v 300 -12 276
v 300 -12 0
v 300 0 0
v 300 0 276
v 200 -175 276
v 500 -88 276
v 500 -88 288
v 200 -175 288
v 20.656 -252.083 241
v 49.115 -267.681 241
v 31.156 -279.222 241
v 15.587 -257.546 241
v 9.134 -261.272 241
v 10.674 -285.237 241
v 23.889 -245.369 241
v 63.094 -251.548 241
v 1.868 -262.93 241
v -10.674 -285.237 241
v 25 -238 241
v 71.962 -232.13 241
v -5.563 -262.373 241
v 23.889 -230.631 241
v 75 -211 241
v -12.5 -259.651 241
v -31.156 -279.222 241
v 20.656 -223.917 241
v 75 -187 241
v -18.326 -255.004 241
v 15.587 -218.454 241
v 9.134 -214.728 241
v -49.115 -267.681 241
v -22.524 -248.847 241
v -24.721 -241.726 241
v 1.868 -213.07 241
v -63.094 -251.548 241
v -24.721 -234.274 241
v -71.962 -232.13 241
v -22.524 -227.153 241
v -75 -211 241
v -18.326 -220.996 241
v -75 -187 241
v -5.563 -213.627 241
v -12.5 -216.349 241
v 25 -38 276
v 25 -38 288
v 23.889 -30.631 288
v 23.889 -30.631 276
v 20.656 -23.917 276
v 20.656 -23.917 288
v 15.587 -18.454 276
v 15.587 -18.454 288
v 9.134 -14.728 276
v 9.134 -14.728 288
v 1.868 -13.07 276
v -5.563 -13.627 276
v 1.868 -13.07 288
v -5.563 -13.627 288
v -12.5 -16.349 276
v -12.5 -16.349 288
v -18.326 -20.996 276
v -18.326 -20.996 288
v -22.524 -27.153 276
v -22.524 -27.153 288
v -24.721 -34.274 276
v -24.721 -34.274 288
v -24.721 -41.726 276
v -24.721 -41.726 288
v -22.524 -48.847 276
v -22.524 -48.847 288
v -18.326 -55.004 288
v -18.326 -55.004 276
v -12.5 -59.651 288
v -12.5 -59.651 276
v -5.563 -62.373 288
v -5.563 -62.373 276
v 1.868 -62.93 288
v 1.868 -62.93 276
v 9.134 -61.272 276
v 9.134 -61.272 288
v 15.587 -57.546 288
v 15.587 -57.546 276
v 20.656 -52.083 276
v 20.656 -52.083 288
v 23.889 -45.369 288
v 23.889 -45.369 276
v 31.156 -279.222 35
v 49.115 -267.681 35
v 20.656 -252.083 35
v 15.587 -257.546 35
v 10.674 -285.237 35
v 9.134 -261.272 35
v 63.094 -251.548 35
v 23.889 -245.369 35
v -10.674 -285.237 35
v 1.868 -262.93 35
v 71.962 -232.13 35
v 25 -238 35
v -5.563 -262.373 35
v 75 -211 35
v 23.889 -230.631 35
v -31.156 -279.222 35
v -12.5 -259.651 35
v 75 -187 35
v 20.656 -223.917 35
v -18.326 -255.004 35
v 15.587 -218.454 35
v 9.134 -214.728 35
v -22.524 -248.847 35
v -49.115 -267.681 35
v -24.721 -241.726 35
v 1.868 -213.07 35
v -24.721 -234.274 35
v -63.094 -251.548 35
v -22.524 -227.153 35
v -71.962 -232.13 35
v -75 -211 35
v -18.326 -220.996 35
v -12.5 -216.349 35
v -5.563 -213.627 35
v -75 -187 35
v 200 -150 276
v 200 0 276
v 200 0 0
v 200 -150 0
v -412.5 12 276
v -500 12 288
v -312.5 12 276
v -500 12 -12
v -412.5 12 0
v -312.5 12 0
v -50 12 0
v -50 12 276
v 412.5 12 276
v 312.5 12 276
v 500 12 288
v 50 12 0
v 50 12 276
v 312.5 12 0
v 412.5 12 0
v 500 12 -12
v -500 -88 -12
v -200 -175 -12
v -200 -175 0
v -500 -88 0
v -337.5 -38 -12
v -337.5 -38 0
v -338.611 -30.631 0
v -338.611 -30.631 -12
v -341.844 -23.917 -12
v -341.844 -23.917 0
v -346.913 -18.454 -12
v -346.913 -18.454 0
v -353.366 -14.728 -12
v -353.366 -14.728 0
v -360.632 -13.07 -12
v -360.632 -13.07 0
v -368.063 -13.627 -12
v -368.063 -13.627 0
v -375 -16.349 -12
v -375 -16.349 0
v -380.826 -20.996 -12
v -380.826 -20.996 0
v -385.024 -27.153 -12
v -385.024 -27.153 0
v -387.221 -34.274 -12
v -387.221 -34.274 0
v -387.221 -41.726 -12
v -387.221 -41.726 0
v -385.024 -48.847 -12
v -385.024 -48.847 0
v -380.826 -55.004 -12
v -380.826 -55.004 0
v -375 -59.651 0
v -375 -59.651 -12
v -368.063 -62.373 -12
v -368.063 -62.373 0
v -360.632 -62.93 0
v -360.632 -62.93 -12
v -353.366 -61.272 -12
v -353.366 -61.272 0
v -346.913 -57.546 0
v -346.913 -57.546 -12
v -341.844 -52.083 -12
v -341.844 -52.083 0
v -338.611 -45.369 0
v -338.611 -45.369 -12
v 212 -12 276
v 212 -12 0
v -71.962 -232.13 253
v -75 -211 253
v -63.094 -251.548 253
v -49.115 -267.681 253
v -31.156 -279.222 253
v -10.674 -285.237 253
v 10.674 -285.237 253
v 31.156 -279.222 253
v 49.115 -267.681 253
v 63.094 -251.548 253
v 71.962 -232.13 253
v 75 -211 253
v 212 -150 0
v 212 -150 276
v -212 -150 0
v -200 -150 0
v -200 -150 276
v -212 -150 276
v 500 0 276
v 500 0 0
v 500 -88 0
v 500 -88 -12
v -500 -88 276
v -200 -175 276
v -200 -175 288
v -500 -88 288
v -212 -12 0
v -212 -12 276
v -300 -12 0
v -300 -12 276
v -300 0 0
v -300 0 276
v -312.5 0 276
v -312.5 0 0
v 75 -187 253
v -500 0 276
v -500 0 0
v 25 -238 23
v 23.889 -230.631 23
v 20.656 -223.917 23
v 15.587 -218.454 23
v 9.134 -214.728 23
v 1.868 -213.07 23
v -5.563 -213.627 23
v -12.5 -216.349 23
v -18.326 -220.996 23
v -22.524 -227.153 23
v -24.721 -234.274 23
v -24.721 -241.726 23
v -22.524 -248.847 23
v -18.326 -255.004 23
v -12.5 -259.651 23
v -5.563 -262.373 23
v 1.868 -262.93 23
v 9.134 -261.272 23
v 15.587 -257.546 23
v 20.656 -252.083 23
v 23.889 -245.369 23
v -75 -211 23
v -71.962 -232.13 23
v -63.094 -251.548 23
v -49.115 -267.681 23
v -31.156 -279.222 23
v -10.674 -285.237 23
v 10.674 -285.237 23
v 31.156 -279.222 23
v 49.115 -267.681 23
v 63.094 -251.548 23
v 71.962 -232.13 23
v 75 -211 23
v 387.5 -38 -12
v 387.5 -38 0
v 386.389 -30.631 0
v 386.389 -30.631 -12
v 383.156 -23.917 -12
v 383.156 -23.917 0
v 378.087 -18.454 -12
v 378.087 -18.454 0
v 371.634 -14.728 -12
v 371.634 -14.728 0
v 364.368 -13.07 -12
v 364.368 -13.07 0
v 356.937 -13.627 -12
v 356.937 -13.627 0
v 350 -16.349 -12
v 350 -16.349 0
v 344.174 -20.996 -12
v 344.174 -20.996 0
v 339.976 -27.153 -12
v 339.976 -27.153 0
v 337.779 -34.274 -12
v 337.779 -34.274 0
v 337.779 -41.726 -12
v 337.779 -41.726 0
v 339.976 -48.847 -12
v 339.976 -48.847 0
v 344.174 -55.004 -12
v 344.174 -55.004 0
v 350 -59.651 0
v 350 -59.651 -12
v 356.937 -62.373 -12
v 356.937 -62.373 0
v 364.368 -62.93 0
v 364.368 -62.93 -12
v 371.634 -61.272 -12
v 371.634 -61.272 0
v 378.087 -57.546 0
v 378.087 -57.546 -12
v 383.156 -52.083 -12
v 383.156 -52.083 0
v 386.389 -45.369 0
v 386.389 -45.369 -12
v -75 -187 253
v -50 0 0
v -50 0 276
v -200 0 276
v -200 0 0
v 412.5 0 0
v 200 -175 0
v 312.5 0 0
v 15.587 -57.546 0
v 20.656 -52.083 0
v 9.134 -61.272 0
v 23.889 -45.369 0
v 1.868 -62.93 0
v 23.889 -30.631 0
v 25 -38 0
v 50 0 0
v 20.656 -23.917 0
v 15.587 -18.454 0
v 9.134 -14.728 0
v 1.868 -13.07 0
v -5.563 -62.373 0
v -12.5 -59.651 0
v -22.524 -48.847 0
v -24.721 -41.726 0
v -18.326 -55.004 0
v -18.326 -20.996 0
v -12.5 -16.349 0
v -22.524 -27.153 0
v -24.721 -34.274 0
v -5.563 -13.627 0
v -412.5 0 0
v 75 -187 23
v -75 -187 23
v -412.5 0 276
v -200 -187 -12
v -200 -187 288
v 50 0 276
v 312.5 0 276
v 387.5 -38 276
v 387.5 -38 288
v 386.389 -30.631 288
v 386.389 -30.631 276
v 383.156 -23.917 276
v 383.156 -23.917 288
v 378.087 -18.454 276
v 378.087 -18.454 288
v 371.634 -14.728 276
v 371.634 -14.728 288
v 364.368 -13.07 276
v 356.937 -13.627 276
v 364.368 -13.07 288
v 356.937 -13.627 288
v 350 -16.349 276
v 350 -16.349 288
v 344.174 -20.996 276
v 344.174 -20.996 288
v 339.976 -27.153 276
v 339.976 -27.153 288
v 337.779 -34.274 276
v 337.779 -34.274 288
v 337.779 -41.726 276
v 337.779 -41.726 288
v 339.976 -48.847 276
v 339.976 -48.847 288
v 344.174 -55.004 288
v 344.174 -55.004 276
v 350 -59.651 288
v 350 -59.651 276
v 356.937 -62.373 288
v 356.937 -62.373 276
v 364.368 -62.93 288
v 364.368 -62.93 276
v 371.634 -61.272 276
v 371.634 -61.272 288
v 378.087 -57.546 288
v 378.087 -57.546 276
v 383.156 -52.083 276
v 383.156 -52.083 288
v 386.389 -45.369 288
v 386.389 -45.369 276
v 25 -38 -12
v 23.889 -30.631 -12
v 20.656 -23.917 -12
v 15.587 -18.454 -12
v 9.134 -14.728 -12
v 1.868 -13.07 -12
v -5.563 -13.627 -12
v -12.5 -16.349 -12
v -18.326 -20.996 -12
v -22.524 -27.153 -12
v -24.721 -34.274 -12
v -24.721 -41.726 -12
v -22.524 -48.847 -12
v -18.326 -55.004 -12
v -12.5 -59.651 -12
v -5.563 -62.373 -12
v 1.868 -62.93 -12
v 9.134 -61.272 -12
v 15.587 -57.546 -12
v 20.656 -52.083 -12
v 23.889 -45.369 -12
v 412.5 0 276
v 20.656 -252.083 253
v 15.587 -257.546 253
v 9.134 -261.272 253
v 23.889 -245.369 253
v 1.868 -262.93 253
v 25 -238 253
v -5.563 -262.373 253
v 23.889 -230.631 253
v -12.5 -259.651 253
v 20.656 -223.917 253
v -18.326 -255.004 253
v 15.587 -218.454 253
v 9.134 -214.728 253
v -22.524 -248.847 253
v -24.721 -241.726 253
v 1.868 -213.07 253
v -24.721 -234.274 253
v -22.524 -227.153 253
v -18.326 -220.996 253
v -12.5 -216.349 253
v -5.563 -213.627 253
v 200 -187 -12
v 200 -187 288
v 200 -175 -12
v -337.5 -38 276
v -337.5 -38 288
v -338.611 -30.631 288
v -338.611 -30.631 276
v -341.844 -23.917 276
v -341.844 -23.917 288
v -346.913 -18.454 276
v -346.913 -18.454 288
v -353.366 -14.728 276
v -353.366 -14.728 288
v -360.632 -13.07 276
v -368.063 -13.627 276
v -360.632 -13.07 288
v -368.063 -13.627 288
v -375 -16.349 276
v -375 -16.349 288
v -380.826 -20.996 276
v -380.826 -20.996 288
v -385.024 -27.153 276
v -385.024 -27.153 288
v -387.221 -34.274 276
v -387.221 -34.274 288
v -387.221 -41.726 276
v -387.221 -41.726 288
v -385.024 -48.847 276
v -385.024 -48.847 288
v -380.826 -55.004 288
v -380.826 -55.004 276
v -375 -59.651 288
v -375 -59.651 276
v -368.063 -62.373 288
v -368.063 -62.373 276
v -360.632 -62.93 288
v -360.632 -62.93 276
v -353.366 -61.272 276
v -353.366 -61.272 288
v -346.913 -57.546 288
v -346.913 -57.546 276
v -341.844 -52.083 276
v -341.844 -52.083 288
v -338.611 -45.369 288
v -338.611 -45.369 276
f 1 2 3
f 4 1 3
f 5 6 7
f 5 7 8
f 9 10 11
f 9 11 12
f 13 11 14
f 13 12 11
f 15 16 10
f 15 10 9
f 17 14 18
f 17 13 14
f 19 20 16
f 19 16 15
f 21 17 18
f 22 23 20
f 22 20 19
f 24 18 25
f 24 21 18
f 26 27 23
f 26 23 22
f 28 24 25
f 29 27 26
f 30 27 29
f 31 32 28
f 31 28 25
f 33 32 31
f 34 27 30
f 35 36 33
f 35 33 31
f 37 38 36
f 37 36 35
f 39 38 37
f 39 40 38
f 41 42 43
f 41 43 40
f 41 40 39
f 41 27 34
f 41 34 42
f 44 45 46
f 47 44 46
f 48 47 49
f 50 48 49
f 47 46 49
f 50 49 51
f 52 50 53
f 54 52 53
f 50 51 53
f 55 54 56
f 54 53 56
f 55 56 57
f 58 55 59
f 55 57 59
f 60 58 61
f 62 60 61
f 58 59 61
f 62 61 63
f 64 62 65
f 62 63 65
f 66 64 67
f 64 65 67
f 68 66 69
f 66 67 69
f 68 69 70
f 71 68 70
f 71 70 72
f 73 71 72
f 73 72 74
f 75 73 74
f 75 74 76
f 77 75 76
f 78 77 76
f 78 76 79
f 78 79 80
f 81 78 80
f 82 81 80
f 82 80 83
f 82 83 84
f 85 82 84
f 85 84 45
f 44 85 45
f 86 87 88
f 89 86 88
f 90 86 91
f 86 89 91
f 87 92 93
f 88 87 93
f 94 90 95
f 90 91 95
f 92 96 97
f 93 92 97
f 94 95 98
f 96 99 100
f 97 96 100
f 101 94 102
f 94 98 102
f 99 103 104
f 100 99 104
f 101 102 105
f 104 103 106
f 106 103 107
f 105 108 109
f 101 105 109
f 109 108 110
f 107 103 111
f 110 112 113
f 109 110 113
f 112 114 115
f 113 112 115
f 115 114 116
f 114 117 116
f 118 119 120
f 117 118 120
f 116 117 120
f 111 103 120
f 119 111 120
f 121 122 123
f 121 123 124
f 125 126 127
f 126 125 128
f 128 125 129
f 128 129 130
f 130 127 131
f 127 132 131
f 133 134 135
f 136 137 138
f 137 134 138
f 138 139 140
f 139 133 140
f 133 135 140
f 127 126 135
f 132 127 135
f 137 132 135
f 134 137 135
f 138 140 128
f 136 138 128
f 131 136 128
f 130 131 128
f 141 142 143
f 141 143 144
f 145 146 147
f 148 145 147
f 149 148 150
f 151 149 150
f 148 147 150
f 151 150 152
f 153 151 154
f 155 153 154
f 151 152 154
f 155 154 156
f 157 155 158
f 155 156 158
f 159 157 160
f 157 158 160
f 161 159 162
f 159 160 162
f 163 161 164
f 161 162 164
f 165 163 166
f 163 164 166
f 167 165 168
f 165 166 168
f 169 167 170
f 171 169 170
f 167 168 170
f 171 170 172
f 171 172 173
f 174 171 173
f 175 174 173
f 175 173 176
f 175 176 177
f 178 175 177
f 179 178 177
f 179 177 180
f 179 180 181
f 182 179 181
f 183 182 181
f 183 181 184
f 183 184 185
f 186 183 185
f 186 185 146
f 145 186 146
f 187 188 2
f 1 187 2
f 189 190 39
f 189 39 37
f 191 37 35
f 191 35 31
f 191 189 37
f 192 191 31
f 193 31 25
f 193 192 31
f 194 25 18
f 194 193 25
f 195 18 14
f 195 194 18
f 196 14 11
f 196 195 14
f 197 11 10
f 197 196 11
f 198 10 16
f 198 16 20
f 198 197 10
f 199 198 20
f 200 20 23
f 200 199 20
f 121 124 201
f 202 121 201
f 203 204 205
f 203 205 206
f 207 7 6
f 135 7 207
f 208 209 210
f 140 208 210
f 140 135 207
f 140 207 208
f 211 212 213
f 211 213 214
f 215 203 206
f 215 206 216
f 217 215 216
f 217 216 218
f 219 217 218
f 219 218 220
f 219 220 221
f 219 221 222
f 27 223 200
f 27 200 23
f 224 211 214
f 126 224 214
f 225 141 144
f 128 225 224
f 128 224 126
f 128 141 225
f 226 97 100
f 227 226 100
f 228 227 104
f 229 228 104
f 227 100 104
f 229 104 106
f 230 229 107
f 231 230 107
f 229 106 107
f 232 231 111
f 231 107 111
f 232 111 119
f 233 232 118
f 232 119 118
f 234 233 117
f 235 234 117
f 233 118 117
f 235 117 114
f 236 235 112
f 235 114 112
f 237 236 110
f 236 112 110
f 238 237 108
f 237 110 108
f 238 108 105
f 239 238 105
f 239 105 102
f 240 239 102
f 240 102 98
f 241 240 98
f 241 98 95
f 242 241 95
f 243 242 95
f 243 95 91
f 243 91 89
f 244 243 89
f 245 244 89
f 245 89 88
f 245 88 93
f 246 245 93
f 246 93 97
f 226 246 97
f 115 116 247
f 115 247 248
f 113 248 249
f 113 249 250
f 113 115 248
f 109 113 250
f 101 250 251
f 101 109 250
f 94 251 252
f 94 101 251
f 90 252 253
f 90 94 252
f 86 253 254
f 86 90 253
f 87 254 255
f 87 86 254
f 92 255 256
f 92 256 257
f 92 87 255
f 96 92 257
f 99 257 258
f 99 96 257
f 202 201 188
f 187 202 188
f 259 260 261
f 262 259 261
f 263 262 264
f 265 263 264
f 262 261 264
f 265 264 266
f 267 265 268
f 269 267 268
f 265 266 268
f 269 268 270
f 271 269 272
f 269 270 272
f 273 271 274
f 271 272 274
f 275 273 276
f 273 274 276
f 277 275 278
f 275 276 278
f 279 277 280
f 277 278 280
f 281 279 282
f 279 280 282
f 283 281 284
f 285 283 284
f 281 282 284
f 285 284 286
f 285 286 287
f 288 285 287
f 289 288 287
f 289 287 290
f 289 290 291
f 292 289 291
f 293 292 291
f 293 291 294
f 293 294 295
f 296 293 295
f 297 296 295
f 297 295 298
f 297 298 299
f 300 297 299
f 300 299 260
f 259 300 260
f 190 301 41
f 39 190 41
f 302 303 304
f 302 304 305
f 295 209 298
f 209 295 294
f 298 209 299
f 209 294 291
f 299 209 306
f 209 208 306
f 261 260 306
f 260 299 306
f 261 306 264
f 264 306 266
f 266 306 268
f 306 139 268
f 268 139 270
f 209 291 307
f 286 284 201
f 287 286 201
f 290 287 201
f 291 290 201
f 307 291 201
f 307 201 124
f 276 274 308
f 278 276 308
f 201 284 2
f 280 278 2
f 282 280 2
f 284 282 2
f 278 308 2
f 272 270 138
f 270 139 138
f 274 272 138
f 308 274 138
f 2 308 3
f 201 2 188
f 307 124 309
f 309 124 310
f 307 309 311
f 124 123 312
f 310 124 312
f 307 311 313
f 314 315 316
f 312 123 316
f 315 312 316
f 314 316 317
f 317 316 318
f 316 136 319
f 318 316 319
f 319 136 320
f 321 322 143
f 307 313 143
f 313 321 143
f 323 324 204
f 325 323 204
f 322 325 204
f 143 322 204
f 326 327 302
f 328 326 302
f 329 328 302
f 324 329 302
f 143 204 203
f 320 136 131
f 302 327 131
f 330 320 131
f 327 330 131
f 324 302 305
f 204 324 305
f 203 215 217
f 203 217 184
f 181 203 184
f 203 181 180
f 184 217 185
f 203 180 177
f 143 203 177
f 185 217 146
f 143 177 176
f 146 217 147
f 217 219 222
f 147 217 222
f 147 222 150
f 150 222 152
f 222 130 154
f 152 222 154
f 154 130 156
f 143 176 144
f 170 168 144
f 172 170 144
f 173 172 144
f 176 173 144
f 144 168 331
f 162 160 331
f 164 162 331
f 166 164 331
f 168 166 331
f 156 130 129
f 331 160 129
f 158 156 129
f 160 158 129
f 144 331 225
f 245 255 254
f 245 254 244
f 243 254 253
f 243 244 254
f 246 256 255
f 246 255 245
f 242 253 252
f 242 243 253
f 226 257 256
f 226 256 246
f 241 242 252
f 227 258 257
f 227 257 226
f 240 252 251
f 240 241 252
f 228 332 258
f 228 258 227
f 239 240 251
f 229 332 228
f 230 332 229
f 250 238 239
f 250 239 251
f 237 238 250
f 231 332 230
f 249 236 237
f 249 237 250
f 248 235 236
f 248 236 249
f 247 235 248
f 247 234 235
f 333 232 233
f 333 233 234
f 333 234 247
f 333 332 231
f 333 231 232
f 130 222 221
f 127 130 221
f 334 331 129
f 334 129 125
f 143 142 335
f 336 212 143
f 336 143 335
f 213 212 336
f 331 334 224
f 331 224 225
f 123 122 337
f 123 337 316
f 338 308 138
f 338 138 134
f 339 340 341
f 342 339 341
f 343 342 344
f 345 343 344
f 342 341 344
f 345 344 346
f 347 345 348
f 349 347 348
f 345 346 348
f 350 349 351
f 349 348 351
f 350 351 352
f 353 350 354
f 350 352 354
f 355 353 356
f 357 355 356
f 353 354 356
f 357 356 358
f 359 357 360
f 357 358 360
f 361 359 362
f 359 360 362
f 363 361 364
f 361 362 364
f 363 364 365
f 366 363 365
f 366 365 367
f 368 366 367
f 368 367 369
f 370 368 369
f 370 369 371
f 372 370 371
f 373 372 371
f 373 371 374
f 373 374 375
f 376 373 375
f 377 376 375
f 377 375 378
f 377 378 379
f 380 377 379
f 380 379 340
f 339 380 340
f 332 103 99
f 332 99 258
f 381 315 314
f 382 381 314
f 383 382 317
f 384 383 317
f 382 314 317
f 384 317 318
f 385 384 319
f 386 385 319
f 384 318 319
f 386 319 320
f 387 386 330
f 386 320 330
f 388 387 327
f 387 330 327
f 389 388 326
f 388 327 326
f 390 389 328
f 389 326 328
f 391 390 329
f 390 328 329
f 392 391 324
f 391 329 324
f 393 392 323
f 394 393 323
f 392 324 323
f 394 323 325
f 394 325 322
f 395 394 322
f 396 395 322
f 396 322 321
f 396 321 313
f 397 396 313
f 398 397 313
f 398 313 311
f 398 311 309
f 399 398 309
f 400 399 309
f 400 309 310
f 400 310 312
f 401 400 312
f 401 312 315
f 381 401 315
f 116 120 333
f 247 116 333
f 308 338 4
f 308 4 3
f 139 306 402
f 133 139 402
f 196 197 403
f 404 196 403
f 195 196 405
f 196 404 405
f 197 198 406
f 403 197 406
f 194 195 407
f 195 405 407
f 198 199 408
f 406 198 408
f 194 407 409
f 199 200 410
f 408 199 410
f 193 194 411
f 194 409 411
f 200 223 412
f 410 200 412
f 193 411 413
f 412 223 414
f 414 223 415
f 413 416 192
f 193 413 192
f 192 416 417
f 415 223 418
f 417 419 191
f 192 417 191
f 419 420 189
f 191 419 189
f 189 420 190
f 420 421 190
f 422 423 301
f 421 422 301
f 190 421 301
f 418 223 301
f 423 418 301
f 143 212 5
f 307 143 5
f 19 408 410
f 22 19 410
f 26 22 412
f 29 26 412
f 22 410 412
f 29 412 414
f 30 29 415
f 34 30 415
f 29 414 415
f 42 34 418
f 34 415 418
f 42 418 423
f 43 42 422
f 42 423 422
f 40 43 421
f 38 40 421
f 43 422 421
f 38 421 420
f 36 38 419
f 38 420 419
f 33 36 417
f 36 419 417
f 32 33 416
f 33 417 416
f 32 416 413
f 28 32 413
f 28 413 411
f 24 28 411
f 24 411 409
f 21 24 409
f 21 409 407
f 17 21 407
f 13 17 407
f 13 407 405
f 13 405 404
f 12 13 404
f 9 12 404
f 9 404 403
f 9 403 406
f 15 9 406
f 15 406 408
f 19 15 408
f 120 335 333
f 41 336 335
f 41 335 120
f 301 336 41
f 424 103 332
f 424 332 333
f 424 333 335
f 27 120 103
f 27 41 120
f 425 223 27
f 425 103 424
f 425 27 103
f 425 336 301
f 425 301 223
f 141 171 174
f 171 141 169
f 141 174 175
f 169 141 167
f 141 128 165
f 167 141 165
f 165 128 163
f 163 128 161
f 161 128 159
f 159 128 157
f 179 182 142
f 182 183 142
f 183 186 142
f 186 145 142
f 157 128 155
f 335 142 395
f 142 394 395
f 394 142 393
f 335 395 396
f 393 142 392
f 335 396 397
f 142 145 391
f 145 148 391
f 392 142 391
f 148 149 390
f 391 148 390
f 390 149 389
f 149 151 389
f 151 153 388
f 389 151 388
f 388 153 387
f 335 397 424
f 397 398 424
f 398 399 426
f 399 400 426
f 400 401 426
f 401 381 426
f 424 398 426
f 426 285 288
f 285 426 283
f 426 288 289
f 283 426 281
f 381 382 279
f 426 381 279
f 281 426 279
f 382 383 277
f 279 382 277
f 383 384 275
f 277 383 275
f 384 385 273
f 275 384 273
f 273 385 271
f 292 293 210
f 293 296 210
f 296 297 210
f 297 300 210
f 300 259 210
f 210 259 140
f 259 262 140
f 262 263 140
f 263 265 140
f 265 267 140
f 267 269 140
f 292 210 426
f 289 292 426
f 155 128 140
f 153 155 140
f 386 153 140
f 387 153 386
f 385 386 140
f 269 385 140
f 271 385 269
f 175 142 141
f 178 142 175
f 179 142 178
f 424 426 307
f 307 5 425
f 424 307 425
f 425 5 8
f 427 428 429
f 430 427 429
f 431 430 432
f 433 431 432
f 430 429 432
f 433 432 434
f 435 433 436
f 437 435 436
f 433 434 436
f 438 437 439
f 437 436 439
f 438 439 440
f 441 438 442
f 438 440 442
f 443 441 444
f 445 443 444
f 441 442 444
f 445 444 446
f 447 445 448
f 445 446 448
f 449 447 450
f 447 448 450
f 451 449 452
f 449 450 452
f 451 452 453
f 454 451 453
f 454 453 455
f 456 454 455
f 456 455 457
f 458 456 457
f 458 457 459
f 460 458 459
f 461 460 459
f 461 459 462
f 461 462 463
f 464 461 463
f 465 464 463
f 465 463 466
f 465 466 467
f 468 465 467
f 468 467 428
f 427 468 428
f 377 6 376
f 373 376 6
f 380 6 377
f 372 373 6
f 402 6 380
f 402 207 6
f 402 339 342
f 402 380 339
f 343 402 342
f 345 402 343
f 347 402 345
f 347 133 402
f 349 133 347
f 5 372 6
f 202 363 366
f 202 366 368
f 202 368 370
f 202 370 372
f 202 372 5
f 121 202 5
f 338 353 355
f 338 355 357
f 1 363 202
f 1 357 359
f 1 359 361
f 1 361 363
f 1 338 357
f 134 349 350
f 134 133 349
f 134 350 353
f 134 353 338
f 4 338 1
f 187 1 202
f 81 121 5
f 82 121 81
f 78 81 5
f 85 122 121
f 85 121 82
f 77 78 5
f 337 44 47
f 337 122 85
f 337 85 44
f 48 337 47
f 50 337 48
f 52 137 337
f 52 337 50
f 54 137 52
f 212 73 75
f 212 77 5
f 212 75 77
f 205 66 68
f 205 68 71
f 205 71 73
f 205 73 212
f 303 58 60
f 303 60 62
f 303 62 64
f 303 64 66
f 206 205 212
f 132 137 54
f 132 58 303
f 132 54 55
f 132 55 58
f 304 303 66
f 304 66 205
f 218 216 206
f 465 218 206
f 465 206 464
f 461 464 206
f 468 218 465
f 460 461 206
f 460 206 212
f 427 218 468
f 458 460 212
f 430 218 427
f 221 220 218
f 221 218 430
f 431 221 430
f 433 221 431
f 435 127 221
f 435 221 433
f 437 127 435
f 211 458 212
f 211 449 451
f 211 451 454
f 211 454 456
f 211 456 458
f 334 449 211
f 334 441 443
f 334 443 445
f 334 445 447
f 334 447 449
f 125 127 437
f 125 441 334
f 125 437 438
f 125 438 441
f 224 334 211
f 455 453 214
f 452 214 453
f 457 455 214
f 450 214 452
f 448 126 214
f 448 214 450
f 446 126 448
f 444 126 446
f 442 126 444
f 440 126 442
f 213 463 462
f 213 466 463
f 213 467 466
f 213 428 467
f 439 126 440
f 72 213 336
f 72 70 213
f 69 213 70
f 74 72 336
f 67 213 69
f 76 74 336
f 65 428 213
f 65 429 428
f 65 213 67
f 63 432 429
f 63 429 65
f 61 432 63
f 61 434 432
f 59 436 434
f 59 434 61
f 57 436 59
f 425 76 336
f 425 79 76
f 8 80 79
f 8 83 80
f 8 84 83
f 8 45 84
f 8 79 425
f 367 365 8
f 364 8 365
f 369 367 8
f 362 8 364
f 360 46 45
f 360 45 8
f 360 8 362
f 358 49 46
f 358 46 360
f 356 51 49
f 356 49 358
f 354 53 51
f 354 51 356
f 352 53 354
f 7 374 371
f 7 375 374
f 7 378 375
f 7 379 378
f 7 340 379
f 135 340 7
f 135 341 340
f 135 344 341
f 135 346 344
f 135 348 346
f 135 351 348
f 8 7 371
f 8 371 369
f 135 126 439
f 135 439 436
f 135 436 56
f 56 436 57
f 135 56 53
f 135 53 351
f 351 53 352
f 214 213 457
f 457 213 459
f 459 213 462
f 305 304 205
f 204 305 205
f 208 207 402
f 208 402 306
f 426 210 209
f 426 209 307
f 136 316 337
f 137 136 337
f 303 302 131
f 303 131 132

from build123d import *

# Parameters (mm, degrees)
EXTRUDE_1_DEPTH        = 276
EXTRUDE_1_2_DEPTH      = 276
EXTRUDE_2_DEPTH        = 12
PATTERN_LINEAR_1_COUNT = 2
PATTERN_LINEAR_1_PITCH = 288
SKETCH_3_W             = 276
SKETCH_3_H             = 12
EXTRUDE_3_DEPTH        = 1000
SKETCH_4_W             = 400
SKETCH_4_H             = 300
EXTRUDE_4_DEPTH        = 12
SKETCH_5_W             = 150
SKETCH_5_H             = 12
EXTRUDE_5_DEPTH        = 100
SKETCH_6_R             = 25
CUT_EXTRUDE_1_DEPTH    = 635.502955076
SKETCH_7_R             = 25
CUT_EXTRUDE_2_DEPTH    = 650.458235763
SKETCH_8_W             = 100
SKETCH_8_H             = 276
CUT_EXTRUDE_3_DEPTH    = 645.003105583


with BuildPart() as part:
    # 草图1 → 凸台-拉伸1 (new body)
    with BuildSketch(Plane.XY):
        Polygon((-300, 0), (-200, 0), (-200, -150), (-212, -150), (-212, -12), (-300, -12), align=None)
    extrude(amount=EXTRUDE_1_DEPTH)



with BuildPart() as body_2:
    # 草图1 → Extrude 1 2 (new body)
    with BuildSketch(Plane.XY):
        Polygon((300, 0), (200, 0), (200, -150), (212, -150), (212, -12), (300, -12), align=None)
    extrude(amount=EXTRUDE_1_2_DEPTH)


with BuildPart() as part_1:
    add(part.part)

    add(body_2.part)  # 凸台-拉伸2 merges body 2
    # 草图2 → 凸台-拉伸2 (add)
    with BuildSketch(Plane.XY.offset(276)):
        Polygon((-500, 12), (500, 12), (500, -88), (200, -175), (-200, -175), (-500, -88), align=None)
    extrude_2 = extrude(amount=EXTRUDE_2_DEPTH)

    # 阵列(线性)1: 凸台-拉伸2 ×2
    with Locations(*[(0, 0, -i * PATTERN_LINEAR_1_PITCH) for i in range(1, PATTERN_LINEAR_1_COUNT)]):
        add(extrude_2)

    # 草图3 → 凸台-拉伸3 (add)
    with BuildSketch(Plane(origin=(500, 0, 0), x_dir=(0, 0, -1), z_dir=(1, 0, 0))):
        with Locations((-138, 6)):
            Rectangle(SKETCH_3_W, SKETCH_3_H)
    extrude(amount=-EXTRUDE_3_DEPTH)

    # 草图4 → 凸台-拉伸4 (add)
    with BuildSketch(Plane.XZ.offset(175)):
        with Locations((0, 138)):
            Rectangle(SKETCH_4_W, SKETCH_4_H)
    extrude(amount=EXTRUDE_4_DEPTH)

    # 草图5 → 凸台-拉伸5 (add)
    with BuildSketch(Plane(origin=(0, -187, 0), x_dir=(-1, 0, 0), z_dir=(0, -1, 0))):
        with Locations((0, -247)):
            Rectangle(SKETCH_5_W, SKETCH_5_H)
        with Locations((0, -29)):
            Rectangle(SKETCH_5_W, SKETCH_5_H)
    extrude(amount=EXTRUDE_5_DEPTH)

    # 草图6 → 切除-拉伸1 (cut, through all)
    with BuildSketch(Plane.XY.offset(253)):
        with Locations((0, -238)):
            Circle(SKETCH_6_R)
        with BuildLine():
            Line((75, -211), (75, -287))
            Line((75, -287), (-75, -287))
            Line((-75, -287), (-75, -211))
            ThreePointArc((-75, -211), (0, -286), (75, -211))
        make_face()
    extrude(amount=-CUT_EXTRUDE_1_DEPTH, mode=Mode.SUBTRACT)

    # 草图7 → 切除-拉伸2 (cut, through all)
    with BuildSketch(Plane.XY.offset(288)):
        with Locations((-362.5, -38)):
            Circle(SKETCH_7_R)
        with Locations((362.5, -38)):
            Circle(SKETCH_7_R)
        with Locations((0, -38)):
            Circle(SKETCH_7_R)
    extrude(amount=-CUT_EXTRUDE_2_DEPTH, mode=Mode.SUBTRACT)

    # 草图8 → 切除-拉伸3 (cut, through all)
    with BuildSketch(Plane.XZ):
        with Locations((362.5, 138)):
            Rectangle(SKETCH_8_W, SKETCH_8_H)
        with Locations((-362.5, 138)):
            Rectangle(SKETCH_8_W, SKETCH_8_H)
        with Locations((0, 138)):
            Rectangle(SKETCH_8_W, SKETCH_8_H)
    extrude(amount=-CUT_EXTRUDE_3_DEPTH, mode=Mode.SUBTRACT)


solid = part_1.part
